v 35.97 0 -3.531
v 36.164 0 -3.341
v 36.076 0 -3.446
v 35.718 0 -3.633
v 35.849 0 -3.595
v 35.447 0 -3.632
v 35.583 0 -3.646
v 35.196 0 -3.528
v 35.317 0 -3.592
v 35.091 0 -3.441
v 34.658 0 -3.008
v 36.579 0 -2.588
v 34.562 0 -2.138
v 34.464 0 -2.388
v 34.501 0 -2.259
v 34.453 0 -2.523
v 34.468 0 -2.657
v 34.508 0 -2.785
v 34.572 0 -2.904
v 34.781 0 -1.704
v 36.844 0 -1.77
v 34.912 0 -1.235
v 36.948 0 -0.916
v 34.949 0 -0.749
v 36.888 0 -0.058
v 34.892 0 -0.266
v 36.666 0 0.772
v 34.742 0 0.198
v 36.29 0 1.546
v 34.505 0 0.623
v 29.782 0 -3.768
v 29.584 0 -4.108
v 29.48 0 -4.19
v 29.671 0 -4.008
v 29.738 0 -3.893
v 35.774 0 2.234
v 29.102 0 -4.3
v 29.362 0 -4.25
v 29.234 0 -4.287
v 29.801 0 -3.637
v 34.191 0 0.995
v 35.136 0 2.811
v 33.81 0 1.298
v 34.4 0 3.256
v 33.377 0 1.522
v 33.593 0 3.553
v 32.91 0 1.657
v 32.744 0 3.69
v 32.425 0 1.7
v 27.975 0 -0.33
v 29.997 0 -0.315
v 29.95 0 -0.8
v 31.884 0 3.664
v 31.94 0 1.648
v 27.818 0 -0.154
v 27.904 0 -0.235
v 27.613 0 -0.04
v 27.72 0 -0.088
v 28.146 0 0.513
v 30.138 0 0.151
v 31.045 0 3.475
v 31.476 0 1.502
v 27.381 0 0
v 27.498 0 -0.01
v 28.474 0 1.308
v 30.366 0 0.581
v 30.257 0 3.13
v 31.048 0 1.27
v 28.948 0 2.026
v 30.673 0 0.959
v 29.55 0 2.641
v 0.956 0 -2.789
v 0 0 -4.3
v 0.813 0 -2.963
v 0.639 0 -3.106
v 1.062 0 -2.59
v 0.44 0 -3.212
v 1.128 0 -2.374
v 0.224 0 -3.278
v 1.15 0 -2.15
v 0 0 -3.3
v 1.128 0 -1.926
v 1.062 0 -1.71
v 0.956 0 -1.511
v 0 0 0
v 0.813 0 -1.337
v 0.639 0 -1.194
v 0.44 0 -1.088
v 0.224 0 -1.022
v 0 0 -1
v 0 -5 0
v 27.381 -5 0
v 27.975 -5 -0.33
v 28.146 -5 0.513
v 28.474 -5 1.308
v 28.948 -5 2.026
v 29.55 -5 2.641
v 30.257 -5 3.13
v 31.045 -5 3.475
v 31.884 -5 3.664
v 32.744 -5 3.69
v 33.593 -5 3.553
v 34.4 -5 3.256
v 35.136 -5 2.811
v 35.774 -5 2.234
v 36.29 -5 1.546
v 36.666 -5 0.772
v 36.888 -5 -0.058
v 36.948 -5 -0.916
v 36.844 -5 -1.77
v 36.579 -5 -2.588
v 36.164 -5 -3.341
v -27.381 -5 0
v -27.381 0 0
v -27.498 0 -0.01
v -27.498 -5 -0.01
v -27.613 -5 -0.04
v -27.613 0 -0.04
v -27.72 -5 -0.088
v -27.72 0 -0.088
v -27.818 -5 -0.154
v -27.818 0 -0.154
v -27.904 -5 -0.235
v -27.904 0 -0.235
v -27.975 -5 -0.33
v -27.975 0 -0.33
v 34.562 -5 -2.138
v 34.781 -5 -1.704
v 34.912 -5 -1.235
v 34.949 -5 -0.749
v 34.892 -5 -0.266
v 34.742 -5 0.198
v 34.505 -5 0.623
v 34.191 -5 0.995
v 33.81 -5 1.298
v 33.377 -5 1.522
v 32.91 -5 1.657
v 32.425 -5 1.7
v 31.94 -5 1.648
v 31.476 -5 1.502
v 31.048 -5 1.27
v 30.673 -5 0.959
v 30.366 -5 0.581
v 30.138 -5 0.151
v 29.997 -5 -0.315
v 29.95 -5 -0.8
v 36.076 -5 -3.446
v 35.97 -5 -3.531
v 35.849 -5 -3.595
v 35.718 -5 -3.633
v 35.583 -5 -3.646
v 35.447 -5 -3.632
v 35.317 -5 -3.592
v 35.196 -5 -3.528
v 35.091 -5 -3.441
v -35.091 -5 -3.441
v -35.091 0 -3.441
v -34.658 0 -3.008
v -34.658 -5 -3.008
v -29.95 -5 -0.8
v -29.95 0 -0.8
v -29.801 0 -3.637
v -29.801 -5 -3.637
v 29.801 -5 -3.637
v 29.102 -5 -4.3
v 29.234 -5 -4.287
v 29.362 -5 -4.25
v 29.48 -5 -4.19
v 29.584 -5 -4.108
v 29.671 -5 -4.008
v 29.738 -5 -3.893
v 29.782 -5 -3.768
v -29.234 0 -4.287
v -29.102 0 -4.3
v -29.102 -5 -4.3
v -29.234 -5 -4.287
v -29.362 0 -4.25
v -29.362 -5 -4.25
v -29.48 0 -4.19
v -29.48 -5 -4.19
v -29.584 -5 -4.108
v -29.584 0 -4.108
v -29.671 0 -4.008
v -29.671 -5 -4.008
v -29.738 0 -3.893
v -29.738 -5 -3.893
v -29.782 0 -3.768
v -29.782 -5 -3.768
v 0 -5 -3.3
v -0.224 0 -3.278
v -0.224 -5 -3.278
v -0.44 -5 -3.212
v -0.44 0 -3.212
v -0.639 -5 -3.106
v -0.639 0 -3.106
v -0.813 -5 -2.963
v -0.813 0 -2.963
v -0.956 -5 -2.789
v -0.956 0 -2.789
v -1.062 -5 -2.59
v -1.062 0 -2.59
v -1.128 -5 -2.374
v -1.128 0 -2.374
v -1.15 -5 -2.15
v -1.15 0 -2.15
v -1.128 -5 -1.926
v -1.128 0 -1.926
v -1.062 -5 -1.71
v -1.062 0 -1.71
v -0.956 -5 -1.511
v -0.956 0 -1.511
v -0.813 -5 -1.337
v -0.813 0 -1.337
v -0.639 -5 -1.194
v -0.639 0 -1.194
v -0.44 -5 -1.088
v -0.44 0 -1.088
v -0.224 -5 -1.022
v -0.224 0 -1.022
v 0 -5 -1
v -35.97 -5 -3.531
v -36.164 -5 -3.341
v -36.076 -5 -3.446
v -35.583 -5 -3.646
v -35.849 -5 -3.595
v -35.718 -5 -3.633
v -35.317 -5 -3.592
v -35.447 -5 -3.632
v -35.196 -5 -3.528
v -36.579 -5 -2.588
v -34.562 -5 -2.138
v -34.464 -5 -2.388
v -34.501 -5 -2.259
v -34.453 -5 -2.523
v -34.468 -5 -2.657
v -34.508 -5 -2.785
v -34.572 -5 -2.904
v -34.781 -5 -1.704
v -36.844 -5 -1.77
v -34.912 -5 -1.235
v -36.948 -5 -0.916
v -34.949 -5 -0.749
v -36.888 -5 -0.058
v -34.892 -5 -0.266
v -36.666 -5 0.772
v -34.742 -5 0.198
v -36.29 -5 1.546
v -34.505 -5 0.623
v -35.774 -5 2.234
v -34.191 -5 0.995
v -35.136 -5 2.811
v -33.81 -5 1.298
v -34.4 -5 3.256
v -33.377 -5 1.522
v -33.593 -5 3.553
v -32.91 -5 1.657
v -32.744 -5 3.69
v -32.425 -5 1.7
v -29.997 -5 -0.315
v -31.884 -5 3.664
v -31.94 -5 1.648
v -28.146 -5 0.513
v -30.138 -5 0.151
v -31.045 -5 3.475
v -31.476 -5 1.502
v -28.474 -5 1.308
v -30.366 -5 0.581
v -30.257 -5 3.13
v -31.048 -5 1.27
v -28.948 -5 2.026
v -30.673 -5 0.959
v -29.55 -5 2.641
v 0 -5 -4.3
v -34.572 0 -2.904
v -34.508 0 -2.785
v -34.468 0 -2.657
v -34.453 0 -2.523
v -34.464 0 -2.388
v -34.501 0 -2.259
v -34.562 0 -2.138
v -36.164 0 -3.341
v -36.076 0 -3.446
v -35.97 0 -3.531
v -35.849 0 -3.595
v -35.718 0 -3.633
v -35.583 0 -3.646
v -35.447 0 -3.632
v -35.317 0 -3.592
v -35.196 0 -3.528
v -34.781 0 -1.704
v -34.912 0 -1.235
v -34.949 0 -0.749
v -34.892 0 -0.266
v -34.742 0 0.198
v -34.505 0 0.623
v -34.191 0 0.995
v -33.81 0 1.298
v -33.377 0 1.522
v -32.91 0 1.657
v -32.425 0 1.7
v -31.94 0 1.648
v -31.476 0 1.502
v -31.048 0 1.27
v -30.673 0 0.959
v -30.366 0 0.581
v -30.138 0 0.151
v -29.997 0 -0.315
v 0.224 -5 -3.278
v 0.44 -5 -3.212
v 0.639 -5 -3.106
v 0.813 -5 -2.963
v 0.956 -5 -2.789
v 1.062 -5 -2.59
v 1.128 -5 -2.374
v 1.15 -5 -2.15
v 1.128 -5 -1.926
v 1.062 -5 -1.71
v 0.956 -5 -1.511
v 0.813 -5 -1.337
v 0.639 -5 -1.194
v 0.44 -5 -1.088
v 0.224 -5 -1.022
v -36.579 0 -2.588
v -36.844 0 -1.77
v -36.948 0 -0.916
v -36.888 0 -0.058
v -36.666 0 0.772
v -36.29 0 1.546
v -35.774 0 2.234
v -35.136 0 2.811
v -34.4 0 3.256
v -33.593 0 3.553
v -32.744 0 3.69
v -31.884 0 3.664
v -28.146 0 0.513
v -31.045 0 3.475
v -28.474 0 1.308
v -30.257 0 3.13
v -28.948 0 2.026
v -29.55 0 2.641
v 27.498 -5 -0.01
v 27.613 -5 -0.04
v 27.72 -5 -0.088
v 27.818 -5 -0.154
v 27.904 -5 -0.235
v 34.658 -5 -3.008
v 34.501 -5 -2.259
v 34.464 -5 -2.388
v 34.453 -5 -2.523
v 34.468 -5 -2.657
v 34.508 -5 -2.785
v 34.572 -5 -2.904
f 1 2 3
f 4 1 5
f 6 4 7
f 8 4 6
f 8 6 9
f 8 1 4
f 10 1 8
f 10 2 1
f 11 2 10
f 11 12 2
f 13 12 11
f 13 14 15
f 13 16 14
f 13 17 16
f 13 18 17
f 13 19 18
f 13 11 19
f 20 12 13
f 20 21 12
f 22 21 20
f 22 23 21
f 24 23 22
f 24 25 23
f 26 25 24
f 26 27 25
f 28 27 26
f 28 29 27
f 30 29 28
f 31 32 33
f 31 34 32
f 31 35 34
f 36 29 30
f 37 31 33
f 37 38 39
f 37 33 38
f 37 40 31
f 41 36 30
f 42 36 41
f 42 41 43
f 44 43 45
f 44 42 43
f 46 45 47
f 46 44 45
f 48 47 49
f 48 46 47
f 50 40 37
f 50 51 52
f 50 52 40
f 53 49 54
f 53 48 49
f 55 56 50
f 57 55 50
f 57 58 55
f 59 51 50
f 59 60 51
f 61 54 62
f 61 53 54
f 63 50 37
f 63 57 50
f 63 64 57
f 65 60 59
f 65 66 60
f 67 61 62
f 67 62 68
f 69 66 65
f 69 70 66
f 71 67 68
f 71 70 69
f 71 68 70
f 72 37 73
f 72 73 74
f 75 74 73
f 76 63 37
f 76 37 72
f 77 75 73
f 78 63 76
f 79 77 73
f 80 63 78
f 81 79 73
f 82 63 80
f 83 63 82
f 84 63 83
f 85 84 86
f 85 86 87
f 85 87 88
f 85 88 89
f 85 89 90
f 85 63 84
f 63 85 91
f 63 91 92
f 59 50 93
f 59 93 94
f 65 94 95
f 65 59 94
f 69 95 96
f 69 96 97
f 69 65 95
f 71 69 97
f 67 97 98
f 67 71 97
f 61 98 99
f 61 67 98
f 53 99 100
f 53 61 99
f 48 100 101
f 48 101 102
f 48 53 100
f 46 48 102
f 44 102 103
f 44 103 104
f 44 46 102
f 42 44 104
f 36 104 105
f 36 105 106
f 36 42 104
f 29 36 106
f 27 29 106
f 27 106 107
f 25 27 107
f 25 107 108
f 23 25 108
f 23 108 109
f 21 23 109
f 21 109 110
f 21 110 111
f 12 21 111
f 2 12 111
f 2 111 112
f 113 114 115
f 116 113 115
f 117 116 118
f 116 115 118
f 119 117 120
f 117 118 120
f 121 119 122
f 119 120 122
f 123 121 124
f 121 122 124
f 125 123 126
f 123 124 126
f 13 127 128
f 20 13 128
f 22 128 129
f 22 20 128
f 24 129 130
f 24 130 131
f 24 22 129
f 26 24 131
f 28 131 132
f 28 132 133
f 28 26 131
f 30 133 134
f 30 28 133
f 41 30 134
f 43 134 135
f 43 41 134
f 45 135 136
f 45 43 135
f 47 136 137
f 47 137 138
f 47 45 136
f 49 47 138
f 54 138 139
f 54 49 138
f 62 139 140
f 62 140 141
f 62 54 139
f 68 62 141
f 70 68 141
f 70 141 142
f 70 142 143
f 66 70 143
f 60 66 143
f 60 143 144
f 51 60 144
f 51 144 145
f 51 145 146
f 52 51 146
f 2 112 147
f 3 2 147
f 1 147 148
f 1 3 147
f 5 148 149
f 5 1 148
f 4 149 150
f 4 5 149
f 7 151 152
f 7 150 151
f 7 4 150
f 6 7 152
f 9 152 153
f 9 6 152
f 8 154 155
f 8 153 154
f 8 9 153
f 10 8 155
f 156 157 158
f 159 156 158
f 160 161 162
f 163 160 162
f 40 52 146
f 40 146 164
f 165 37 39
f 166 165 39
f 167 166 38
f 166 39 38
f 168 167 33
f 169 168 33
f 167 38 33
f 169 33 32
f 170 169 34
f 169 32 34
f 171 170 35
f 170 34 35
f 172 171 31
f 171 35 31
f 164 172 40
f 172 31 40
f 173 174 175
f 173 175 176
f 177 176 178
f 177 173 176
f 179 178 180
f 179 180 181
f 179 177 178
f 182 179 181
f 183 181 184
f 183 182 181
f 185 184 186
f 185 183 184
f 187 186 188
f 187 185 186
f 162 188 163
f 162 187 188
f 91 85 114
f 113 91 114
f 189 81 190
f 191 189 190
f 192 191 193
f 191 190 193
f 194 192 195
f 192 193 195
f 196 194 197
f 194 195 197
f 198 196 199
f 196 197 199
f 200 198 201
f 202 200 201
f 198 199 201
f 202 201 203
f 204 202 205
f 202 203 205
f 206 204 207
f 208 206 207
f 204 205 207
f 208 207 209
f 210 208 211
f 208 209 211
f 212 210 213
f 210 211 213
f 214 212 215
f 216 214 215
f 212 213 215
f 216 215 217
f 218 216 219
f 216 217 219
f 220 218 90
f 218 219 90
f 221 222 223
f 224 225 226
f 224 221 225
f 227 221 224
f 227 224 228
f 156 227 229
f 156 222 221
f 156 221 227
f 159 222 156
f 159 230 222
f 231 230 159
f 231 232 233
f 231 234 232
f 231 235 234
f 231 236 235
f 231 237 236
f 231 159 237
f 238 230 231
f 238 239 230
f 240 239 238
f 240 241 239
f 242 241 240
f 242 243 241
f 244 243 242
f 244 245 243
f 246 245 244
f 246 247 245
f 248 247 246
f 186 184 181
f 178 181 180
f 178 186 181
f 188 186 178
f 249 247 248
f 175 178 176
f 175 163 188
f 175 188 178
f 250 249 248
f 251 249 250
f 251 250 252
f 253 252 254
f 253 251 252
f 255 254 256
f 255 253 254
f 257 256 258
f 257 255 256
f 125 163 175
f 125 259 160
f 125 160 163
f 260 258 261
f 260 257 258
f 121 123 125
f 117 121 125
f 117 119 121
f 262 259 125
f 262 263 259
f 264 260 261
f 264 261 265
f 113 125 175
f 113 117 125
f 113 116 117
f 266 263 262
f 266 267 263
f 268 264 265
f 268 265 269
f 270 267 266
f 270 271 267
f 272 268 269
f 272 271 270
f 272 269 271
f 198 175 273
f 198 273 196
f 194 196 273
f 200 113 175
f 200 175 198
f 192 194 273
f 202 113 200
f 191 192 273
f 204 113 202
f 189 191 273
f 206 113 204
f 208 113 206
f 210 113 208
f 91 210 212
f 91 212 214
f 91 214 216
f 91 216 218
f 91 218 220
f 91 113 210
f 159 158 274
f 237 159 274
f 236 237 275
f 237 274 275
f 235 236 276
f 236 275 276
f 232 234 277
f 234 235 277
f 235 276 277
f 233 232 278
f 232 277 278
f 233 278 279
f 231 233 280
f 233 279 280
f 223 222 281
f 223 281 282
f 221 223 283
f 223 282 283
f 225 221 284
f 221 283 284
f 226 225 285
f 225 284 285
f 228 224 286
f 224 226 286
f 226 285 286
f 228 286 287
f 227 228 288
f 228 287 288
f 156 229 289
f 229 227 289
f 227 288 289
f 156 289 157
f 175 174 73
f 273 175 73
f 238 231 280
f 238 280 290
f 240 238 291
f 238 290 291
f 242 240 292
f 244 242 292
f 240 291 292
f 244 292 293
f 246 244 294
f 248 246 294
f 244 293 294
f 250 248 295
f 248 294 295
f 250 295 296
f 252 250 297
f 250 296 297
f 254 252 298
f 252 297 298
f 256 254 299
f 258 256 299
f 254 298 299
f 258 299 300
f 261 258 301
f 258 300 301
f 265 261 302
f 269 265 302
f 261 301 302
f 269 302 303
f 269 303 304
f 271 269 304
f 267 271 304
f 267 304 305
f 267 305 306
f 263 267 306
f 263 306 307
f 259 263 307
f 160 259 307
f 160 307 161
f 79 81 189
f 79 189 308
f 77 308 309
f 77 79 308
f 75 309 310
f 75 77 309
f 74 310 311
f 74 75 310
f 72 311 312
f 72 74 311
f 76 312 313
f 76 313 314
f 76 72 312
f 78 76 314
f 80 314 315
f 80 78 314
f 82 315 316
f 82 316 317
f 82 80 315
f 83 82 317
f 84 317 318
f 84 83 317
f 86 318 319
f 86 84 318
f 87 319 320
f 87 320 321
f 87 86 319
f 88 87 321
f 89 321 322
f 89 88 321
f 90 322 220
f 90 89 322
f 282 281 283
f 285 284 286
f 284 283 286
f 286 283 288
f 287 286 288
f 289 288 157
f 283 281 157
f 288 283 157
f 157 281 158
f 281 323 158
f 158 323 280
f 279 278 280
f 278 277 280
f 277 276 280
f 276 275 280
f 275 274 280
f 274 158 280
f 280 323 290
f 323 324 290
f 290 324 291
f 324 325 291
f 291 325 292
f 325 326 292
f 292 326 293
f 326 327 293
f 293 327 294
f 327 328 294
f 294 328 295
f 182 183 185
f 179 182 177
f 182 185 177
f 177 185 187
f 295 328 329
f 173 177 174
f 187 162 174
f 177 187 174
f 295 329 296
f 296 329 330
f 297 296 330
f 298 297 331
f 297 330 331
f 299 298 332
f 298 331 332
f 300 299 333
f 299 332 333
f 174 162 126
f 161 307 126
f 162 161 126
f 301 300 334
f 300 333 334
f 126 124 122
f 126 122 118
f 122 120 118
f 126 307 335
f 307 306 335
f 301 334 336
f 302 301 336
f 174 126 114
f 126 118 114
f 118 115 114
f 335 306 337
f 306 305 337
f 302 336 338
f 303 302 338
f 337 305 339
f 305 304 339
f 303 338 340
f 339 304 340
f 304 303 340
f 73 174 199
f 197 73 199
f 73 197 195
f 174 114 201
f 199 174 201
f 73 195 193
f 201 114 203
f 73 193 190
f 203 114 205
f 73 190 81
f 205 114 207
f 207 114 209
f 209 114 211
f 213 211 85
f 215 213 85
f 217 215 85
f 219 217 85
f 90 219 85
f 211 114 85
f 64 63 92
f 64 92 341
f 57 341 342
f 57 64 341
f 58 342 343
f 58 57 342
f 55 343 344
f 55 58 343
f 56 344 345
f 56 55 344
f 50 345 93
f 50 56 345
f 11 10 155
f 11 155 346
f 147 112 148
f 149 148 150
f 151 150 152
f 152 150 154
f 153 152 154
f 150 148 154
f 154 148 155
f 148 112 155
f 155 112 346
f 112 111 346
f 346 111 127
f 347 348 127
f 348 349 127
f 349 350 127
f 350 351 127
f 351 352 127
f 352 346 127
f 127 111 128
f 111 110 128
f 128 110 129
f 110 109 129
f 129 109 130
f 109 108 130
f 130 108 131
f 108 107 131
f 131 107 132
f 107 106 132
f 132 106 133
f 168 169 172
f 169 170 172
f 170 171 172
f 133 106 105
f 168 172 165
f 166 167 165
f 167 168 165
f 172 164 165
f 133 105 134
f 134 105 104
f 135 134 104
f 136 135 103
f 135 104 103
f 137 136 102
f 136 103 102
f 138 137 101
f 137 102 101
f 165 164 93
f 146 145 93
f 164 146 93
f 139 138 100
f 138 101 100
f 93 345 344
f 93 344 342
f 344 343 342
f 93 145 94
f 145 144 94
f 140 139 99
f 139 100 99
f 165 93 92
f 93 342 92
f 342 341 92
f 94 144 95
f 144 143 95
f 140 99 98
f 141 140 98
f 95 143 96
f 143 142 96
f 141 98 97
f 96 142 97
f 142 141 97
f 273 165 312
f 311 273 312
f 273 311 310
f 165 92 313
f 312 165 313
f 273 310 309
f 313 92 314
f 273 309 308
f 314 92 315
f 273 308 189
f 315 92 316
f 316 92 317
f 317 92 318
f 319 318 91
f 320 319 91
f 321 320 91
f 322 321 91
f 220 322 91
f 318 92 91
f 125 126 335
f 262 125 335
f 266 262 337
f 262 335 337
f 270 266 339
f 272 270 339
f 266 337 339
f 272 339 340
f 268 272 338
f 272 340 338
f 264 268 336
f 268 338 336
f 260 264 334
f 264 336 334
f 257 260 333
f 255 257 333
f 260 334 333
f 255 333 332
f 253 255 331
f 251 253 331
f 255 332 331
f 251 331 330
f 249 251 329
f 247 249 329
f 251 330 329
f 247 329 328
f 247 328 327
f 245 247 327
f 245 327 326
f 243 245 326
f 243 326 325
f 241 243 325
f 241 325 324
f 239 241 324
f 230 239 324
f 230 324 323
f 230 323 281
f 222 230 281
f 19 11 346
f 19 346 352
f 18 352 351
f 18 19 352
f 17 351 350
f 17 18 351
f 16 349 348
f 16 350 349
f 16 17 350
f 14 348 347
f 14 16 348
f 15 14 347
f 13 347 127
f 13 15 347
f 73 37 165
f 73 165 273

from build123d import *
from build123d import SkipClean  # not in build123d's __all__

# Parameters (mm, degrees)
F1_DEPTH    = 5
F2_T1_DEPTH = 8.0563067351
F2_T3_DEPTH = 8.3213759835
F2_T5_DEPTH = 8.112494996
F2_T7_DEPTH = 9.1625838734


# Not quite as in the source:
# - a fillet or chamfer that OpenCascade refuses, or shapes differently, is made with other operations: its cross-section is extruded or revolved along the edge and cut away or added


with BuildPart() as f1:
    # F0 (on Front) → F1 (new body)
    with BuildSketch(Plane.XZ):
        with BuildLine():
            Line((0, -1), (0, 0))
            Line((0, 0), (-27.9919262234, 0))
            Line((-27.9919262234, 0), (-27.9746514708, -0.3296219153))
            ThreePointArc((-27.9746514708, -0.3296219153), (-34.3872999356, 3.2616337796), (-35.6319805153, -3.9819805153))
            Line((-35.6319805153, -3.9819805153), (-34.217766953, -2.567766953))
            ThreePointArc((-34.217766953, -2.567766953), (-33.4067085809, 1.5096988313), (-29.95, -0.8))
            Line((-29.95, -0.8), (-29.7665727725, -4.3))
            Line((-29.7665727725, -4.3), (0, -4.3))
            Line((0, -4.3), (0, -3.3))
            ThreePointArc((0, -3.3), (-1.15, -2.15), (0, -1))
        make_face()
        with BuildLine():
            Line((-27.95, -0.8), (-27.9746514708, -0.3296219153))
            ThreePointArc((-27.9746514708, -0.3296219153), (-27.9561670936, -0.5644881969), (-27.95, -0.8))
        make_face(mode=Mode.SUBTRACT)
        with BuildLine():
            ThreePointArc((-27.95, -0.8), (-27.9561670936, -0.5644881969), (-27.9746514708, -0.3296219153))
            Line((-27.9746514708, -0.3296219153), (-27.95, -0.8))
        make_face()
    extrude(amount=F1_DEPTH)

    # F2: fillet of radius 0.7 on 4 edges, made by hand

    # F2_s2 → F2_t1 (cut)
    with BuildSketch(Plane.XZ.offset(-1.5281533676)):
        with BuildLine():
            ThreePointArc((-27.3806648764, 0), (-27.7203230433, -0.0879278395), (-27.9746514708, -0.3296219153))
            Line((-27.9746514708, -0.3296219153), (-27.9919262234, 0))
            Line((-27.9919262234, 0), (-27.3806648764, 0))
        make_face()
    extrude(amount=F2_T1_DEPTH, mode=Mode.SUBTRACT)

    # F2_s4 → F2_t3 (cut)
    with BuildSketch(Plane.XZ.offset(-1.6606879918)):
        with BuildLine():
            ThreePointArc((-29.1022975758, -4.3), (-29.5841457788, -4.1077620597), (-29.8013382501, -3.6366351694))
            Line((-29.8013382501, -3.6366351694), (-29.7665727725, -4.3))
            Line((-29.7665727725, -4.3), (-29.1022975758, -4.3))
        make_face()
    extrude(amount=F2_T3_DEPTH, mode=Mode.SUBTRACT)

    # F2_s6 → F2_t5 (cut)
    with BuildSketch(Plane.XZ.offset(-1.556247498)):
        with BuildLine():
            ThreePointArc((-34.6579402166, -3.0079402166), (-34.4571662087, -2.5899957909), (-34.5616523152, -2.1382542732))
            ThreePointArc((-34.5616523152, -2.1382542732), (-34.4015618745, -2.3625), (-34.217766953, -2.567766953))
            Line((-34.217766953, -2.567766953), (-34.6579402166, -3.0079402166))
        make_face()
    extrude(amount=F2_T5_DEPTH, mode=Mode.SUBTRACT)

    # F2_s8 → F2_t7 (cut)
    with BuildSketch(Plane.XZ.offset(-2.0812919367)):
        with BuildLine():
            ThreePointArc((-36.1636809848, -3.3413723739), (-35.6507485808, -3.6430465403), (-35.0910225292, -3.4410225292))
            Line((-35.0910225292, -3.4410225292), (-35.6319805153, -3.9819805153))
            ThreePointArc((-35.6319805153, -3.9819805153), (-35.9126769383, -3.6739986815), (-36.1636809848, -3.3413723739))
        make_face()
    extrude(amount=F2_T7_DEPTH, mode=Mode.SUBTRACT)

    # F3: F1 across plane


with BuildPart() as f1_1:
    add(f1.part, clean=False)
    with SkipClean():  # cleaning this boolean's faces spoils the solid; the shape is the same uncleaned
        add(f1.part.mirror(Plane.YZ), clean=False)


solid = f1_1.part
